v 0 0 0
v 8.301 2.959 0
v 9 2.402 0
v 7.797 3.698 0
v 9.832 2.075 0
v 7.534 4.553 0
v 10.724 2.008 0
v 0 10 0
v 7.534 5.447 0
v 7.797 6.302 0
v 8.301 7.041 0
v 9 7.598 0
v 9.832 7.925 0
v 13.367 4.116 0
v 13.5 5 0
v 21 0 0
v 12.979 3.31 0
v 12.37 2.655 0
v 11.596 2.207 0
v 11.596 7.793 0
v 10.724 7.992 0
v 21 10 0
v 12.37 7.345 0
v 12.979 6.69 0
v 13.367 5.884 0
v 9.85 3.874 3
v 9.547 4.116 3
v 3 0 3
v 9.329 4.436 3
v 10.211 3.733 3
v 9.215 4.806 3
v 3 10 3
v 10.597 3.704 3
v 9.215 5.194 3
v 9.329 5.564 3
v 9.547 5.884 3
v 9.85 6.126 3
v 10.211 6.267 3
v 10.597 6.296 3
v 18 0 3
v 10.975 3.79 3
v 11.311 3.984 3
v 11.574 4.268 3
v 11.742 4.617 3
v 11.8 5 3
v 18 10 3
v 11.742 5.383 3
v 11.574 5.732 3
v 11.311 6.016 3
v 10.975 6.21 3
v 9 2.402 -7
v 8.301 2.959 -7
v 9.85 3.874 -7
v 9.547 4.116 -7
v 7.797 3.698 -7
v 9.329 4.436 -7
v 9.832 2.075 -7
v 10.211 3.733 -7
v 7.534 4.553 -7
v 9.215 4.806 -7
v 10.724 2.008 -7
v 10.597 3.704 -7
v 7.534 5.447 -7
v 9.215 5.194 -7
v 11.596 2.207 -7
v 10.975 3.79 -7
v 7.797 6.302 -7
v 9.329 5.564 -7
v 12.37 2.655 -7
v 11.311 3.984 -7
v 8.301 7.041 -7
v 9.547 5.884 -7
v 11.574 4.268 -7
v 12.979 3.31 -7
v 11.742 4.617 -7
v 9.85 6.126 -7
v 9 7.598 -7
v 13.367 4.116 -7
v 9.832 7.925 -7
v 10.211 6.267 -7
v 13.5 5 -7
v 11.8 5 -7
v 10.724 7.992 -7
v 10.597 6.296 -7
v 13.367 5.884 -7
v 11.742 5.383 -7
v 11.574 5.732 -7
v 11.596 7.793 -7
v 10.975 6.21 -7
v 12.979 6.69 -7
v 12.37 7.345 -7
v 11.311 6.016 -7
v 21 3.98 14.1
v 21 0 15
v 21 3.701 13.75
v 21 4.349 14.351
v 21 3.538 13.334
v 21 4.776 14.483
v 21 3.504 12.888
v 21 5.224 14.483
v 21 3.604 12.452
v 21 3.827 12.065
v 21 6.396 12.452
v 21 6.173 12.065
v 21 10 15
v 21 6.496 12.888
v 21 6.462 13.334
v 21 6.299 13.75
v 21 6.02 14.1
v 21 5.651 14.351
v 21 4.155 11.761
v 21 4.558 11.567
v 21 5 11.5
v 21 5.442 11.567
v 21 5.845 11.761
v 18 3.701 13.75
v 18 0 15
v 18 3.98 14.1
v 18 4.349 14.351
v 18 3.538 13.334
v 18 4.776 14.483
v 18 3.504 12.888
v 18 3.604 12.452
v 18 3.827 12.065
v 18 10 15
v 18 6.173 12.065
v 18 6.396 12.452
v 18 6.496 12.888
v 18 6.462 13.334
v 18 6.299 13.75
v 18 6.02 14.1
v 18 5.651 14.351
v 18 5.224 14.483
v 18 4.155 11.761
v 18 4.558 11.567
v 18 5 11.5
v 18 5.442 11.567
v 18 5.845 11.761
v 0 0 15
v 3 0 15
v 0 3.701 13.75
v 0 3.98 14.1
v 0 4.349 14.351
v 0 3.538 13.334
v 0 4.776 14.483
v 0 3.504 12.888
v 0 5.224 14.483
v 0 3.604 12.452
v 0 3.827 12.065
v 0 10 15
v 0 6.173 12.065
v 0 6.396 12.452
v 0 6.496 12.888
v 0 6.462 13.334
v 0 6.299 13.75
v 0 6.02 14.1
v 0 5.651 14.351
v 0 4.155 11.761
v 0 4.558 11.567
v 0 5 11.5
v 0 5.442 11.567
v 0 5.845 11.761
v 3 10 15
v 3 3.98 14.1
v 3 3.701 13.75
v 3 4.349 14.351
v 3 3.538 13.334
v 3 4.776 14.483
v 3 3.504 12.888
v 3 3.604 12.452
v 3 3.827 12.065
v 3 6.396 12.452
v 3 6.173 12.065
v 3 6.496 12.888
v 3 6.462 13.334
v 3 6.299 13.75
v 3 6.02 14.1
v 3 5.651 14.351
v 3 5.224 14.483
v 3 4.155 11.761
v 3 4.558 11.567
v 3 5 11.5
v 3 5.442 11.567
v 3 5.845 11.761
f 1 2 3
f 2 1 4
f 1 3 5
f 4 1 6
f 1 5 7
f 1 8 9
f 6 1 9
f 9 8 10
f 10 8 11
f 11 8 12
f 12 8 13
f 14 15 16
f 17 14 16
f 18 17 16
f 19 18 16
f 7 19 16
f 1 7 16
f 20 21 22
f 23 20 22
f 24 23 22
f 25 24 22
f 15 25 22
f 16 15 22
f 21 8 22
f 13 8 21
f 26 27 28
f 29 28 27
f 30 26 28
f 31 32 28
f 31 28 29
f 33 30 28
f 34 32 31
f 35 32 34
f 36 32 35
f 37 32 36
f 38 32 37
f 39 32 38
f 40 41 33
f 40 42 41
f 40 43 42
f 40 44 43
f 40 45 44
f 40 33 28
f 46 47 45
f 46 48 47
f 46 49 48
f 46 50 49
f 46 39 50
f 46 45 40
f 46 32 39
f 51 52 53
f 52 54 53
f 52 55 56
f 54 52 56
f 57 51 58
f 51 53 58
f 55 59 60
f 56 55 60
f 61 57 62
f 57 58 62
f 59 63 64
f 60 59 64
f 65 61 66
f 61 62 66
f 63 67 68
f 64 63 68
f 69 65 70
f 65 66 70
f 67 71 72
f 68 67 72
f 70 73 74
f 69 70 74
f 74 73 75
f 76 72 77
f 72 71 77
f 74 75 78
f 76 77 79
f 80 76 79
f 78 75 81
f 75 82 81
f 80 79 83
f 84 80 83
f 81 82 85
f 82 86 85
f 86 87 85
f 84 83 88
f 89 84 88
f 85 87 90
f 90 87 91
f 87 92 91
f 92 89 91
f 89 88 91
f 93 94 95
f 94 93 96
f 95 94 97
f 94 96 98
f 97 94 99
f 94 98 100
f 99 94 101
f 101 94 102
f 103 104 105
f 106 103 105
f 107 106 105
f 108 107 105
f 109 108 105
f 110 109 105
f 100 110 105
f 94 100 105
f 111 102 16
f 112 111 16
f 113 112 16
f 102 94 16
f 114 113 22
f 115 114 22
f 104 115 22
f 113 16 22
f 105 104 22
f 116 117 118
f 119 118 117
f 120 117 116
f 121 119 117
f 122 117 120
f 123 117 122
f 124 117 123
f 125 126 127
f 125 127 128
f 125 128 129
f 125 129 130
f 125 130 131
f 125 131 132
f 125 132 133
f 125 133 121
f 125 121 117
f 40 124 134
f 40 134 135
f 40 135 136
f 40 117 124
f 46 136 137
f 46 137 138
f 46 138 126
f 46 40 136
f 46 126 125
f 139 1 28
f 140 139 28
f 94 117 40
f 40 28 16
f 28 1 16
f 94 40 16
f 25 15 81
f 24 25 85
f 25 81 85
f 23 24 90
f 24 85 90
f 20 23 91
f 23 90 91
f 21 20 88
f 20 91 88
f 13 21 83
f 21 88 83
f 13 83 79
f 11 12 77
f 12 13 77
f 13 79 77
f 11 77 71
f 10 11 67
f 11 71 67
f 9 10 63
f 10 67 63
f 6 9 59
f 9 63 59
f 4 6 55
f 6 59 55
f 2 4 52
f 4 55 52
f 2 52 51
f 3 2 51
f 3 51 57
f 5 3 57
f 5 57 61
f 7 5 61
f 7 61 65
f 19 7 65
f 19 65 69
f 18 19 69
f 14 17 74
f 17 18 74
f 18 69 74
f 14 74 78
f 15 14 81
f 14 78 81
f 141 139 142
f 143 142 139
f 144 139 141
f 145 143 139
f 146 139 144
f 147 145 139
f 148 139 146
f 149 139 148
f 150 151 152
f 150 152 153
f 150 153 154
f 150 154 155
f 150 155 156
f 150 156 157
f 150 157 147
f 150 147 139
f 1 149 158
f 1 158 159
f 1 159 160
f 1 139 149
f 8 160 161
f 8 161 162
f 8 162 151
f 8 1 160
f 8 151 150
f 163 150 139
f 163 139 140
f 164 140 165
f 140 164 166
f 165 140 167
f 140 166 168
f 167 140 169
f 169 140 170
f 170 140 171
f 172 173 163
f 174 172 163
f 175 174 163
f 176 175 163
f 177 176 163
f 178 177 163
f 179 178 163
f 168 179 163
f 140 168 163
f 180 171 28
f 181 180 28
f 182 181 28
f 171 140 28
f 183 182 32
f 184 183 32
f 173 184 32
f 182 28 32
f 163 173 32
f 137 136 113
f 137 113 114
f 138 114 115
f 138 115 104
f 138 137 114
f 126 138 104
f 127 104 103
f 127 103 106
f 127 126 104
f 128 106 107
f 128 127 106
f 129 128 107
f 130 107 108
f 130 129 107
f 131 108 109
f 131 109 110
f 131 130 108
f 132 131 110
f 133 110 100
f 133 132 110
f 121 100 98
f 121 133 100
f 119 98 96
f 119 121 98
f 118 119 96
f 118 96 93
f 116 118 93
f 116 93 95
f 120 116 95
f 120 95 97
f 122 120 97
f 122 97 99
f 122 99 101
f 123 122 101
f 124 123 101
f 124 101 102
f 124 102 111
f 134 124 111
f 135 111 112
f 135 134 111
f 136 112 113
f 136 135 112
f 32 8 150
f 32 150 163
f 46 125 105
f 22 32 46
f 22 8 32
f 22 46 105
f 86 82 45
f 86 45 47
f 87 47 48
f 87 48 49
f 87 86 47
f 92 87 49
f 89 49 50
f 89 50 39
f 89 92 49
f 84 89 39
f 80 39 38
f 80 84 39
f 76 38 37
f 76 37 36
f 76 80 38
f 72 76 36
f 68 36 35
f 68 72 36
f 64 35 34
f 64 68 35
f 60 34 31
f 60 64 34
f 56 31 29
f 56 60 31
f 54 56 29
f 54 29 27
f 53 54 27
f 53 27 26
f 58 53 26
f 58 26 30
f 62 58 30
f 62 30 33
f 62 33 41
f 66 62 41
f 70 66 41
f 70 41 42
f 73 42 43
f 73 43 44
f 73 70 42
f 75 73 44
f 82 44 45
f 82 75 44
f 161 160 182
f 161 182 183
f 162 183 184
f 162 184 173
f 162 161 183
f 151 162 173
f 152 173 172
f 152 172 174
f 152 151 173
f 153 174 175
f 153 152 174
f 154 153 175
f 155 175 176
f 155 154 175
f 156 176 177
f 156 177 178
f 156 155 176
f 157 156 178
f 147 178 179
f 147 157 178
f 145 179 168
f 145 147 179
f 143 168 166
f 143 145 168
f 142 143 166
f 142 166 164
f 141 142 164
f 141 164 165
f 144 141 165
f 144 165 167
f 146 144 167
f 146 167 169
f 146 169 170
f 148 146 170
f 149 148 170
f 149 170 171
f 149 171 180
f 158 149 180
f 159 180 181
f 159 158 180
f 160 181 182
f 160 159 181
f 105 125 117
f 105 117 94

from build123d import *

# Parameters (mm, degrees)
CYLINDER003_R           = 1.3
CYLINDER003_DEPTH       = 10
CYLINDER001_R           = 1.5
CYLINDER001_DEPTH       = 3
CYLINDER001_PITCH_ANGLE = 90
CYLINDER_R              = 1.5
CYLINDER_DEPTH          = 3
CYLINDER_PITCH_ANGLE    = 90
CYLINDER002_R           = 3
CYLINDER002_DEPTH       = 8
BOX001_W                = 3
BOX001_H                = 10
BOX001_DEPTH            = 15
BOX002_W                = 3
BOX002_H                = 10
BOX002_DEPTH            = 15
BOX_W                   = 21
BOX_H                   = 10
BOX_DEPTH               = 3


with BuildPart() as cylinder001:
    # Cylinder003 → Cylinder003 (new body)
    with BuildSketch(Plane(origin=(10.5, 5, -7), x_dir=(1, 0, 0), z_dir=(0, 0, 1))):
        Circle(CYLINDER003_R)
    extrude(amount=CYLINDER003_DEPTH)


with BuildPart() as hole002:
    # Cylinder001 → Cylinder001 (new body)
    with BuildSketch(Plane.XY):
        Circle(CYLINDER001_R)
    extrude(amount=CYLINDER001_DEPTH)


with BuildPart() as hole002_1:
    # Cylinder001 pitch: moved
    add(hole002.part.rotate(Axis((0, 0, 0), (0, 1, 0)), CYLINDER001_PITCH_ANGLE))


with BuildPart() as hole002_2:
    # Cylinder001 placement: moved
    add(hole002_1.part.moved(Location((18, 5, 13))))


with BuildPart() as hole1:
    # Cylinder → Cylinder (new body)
    with BuildSketch(Plane.XY):
        Circle(CYLINDER_R)
    extrude(amount=CYLINDER_DEPTH)


with BuildPart() as hole1_1:
    # Cylinder pitch: moved
    add(hole1.part.rotate(Axis((0, 0, 0), (0, 1, 0)), CYLINDER_PITCH_ANGLE))


with BuildPart() as hole1_2:
    # Cylinder placement: moved
    add(hole1_1.part.moved(Location((0, 5, 13))))


with BuildPart() as cylinder:
    # Cylinder002 → Cylinder002 (new body)
    with BuildSketch(Plane(origin=(10.5, 5, -7), x_dir=(1, 0, 0), z_dir=(0, 0, 1))):
        Circle(CYLINDER002_R)
    extrude(amount=CYLINDER002_DEPTH)


with BuildPart() as cube001:
    # Box001 → Box001 (new body)
    with BuildSketch(Plane.XY):
        with Locations((1.5, 5)):
            Rectangle(BOX001_W, BOX001_H)
    extrude(amount=BOX001_DEPTH)


with BuildPart() as cube002:
    # Box002 → Box002 (new body)
    with BuildSketch(Plane(origin=(18, 0, 0), x_dir=(1, 0, 0), z_dir=(0, 0, 1))):
        with Locations((1.5, 5)):
            Rectangle(BOX002_W, BOX002_H)
    extrude(amount=BOX002_DEPTH)


with BuildPart() as cut002:
    # Box → Box (new body)
    with BuildSketch(Plane.XY):
        with Locations((10.5, 5)):
            Rectangle(BOX_W, BOX_H)
    extrude(amount=BOX_DEPTH)

    # Fusion: union Cube001, Cube002
    add(cube001.part)
    add(cube002.part)

    # Fusion001: union Cylinder
    add(cylinder.part)

    # Cut: cut Hole1
    add(hole1_2.part, mode=Mode.SUBTRACT)

    # Cut001: cut Hole002
    add(hole002_2.part, mode=Mode.SUBTRACT)

    # Cut002: cut Cylinder001
    add(cylinder001.part, mode=Mode.SUBTRACT)


solid = cut002.part
